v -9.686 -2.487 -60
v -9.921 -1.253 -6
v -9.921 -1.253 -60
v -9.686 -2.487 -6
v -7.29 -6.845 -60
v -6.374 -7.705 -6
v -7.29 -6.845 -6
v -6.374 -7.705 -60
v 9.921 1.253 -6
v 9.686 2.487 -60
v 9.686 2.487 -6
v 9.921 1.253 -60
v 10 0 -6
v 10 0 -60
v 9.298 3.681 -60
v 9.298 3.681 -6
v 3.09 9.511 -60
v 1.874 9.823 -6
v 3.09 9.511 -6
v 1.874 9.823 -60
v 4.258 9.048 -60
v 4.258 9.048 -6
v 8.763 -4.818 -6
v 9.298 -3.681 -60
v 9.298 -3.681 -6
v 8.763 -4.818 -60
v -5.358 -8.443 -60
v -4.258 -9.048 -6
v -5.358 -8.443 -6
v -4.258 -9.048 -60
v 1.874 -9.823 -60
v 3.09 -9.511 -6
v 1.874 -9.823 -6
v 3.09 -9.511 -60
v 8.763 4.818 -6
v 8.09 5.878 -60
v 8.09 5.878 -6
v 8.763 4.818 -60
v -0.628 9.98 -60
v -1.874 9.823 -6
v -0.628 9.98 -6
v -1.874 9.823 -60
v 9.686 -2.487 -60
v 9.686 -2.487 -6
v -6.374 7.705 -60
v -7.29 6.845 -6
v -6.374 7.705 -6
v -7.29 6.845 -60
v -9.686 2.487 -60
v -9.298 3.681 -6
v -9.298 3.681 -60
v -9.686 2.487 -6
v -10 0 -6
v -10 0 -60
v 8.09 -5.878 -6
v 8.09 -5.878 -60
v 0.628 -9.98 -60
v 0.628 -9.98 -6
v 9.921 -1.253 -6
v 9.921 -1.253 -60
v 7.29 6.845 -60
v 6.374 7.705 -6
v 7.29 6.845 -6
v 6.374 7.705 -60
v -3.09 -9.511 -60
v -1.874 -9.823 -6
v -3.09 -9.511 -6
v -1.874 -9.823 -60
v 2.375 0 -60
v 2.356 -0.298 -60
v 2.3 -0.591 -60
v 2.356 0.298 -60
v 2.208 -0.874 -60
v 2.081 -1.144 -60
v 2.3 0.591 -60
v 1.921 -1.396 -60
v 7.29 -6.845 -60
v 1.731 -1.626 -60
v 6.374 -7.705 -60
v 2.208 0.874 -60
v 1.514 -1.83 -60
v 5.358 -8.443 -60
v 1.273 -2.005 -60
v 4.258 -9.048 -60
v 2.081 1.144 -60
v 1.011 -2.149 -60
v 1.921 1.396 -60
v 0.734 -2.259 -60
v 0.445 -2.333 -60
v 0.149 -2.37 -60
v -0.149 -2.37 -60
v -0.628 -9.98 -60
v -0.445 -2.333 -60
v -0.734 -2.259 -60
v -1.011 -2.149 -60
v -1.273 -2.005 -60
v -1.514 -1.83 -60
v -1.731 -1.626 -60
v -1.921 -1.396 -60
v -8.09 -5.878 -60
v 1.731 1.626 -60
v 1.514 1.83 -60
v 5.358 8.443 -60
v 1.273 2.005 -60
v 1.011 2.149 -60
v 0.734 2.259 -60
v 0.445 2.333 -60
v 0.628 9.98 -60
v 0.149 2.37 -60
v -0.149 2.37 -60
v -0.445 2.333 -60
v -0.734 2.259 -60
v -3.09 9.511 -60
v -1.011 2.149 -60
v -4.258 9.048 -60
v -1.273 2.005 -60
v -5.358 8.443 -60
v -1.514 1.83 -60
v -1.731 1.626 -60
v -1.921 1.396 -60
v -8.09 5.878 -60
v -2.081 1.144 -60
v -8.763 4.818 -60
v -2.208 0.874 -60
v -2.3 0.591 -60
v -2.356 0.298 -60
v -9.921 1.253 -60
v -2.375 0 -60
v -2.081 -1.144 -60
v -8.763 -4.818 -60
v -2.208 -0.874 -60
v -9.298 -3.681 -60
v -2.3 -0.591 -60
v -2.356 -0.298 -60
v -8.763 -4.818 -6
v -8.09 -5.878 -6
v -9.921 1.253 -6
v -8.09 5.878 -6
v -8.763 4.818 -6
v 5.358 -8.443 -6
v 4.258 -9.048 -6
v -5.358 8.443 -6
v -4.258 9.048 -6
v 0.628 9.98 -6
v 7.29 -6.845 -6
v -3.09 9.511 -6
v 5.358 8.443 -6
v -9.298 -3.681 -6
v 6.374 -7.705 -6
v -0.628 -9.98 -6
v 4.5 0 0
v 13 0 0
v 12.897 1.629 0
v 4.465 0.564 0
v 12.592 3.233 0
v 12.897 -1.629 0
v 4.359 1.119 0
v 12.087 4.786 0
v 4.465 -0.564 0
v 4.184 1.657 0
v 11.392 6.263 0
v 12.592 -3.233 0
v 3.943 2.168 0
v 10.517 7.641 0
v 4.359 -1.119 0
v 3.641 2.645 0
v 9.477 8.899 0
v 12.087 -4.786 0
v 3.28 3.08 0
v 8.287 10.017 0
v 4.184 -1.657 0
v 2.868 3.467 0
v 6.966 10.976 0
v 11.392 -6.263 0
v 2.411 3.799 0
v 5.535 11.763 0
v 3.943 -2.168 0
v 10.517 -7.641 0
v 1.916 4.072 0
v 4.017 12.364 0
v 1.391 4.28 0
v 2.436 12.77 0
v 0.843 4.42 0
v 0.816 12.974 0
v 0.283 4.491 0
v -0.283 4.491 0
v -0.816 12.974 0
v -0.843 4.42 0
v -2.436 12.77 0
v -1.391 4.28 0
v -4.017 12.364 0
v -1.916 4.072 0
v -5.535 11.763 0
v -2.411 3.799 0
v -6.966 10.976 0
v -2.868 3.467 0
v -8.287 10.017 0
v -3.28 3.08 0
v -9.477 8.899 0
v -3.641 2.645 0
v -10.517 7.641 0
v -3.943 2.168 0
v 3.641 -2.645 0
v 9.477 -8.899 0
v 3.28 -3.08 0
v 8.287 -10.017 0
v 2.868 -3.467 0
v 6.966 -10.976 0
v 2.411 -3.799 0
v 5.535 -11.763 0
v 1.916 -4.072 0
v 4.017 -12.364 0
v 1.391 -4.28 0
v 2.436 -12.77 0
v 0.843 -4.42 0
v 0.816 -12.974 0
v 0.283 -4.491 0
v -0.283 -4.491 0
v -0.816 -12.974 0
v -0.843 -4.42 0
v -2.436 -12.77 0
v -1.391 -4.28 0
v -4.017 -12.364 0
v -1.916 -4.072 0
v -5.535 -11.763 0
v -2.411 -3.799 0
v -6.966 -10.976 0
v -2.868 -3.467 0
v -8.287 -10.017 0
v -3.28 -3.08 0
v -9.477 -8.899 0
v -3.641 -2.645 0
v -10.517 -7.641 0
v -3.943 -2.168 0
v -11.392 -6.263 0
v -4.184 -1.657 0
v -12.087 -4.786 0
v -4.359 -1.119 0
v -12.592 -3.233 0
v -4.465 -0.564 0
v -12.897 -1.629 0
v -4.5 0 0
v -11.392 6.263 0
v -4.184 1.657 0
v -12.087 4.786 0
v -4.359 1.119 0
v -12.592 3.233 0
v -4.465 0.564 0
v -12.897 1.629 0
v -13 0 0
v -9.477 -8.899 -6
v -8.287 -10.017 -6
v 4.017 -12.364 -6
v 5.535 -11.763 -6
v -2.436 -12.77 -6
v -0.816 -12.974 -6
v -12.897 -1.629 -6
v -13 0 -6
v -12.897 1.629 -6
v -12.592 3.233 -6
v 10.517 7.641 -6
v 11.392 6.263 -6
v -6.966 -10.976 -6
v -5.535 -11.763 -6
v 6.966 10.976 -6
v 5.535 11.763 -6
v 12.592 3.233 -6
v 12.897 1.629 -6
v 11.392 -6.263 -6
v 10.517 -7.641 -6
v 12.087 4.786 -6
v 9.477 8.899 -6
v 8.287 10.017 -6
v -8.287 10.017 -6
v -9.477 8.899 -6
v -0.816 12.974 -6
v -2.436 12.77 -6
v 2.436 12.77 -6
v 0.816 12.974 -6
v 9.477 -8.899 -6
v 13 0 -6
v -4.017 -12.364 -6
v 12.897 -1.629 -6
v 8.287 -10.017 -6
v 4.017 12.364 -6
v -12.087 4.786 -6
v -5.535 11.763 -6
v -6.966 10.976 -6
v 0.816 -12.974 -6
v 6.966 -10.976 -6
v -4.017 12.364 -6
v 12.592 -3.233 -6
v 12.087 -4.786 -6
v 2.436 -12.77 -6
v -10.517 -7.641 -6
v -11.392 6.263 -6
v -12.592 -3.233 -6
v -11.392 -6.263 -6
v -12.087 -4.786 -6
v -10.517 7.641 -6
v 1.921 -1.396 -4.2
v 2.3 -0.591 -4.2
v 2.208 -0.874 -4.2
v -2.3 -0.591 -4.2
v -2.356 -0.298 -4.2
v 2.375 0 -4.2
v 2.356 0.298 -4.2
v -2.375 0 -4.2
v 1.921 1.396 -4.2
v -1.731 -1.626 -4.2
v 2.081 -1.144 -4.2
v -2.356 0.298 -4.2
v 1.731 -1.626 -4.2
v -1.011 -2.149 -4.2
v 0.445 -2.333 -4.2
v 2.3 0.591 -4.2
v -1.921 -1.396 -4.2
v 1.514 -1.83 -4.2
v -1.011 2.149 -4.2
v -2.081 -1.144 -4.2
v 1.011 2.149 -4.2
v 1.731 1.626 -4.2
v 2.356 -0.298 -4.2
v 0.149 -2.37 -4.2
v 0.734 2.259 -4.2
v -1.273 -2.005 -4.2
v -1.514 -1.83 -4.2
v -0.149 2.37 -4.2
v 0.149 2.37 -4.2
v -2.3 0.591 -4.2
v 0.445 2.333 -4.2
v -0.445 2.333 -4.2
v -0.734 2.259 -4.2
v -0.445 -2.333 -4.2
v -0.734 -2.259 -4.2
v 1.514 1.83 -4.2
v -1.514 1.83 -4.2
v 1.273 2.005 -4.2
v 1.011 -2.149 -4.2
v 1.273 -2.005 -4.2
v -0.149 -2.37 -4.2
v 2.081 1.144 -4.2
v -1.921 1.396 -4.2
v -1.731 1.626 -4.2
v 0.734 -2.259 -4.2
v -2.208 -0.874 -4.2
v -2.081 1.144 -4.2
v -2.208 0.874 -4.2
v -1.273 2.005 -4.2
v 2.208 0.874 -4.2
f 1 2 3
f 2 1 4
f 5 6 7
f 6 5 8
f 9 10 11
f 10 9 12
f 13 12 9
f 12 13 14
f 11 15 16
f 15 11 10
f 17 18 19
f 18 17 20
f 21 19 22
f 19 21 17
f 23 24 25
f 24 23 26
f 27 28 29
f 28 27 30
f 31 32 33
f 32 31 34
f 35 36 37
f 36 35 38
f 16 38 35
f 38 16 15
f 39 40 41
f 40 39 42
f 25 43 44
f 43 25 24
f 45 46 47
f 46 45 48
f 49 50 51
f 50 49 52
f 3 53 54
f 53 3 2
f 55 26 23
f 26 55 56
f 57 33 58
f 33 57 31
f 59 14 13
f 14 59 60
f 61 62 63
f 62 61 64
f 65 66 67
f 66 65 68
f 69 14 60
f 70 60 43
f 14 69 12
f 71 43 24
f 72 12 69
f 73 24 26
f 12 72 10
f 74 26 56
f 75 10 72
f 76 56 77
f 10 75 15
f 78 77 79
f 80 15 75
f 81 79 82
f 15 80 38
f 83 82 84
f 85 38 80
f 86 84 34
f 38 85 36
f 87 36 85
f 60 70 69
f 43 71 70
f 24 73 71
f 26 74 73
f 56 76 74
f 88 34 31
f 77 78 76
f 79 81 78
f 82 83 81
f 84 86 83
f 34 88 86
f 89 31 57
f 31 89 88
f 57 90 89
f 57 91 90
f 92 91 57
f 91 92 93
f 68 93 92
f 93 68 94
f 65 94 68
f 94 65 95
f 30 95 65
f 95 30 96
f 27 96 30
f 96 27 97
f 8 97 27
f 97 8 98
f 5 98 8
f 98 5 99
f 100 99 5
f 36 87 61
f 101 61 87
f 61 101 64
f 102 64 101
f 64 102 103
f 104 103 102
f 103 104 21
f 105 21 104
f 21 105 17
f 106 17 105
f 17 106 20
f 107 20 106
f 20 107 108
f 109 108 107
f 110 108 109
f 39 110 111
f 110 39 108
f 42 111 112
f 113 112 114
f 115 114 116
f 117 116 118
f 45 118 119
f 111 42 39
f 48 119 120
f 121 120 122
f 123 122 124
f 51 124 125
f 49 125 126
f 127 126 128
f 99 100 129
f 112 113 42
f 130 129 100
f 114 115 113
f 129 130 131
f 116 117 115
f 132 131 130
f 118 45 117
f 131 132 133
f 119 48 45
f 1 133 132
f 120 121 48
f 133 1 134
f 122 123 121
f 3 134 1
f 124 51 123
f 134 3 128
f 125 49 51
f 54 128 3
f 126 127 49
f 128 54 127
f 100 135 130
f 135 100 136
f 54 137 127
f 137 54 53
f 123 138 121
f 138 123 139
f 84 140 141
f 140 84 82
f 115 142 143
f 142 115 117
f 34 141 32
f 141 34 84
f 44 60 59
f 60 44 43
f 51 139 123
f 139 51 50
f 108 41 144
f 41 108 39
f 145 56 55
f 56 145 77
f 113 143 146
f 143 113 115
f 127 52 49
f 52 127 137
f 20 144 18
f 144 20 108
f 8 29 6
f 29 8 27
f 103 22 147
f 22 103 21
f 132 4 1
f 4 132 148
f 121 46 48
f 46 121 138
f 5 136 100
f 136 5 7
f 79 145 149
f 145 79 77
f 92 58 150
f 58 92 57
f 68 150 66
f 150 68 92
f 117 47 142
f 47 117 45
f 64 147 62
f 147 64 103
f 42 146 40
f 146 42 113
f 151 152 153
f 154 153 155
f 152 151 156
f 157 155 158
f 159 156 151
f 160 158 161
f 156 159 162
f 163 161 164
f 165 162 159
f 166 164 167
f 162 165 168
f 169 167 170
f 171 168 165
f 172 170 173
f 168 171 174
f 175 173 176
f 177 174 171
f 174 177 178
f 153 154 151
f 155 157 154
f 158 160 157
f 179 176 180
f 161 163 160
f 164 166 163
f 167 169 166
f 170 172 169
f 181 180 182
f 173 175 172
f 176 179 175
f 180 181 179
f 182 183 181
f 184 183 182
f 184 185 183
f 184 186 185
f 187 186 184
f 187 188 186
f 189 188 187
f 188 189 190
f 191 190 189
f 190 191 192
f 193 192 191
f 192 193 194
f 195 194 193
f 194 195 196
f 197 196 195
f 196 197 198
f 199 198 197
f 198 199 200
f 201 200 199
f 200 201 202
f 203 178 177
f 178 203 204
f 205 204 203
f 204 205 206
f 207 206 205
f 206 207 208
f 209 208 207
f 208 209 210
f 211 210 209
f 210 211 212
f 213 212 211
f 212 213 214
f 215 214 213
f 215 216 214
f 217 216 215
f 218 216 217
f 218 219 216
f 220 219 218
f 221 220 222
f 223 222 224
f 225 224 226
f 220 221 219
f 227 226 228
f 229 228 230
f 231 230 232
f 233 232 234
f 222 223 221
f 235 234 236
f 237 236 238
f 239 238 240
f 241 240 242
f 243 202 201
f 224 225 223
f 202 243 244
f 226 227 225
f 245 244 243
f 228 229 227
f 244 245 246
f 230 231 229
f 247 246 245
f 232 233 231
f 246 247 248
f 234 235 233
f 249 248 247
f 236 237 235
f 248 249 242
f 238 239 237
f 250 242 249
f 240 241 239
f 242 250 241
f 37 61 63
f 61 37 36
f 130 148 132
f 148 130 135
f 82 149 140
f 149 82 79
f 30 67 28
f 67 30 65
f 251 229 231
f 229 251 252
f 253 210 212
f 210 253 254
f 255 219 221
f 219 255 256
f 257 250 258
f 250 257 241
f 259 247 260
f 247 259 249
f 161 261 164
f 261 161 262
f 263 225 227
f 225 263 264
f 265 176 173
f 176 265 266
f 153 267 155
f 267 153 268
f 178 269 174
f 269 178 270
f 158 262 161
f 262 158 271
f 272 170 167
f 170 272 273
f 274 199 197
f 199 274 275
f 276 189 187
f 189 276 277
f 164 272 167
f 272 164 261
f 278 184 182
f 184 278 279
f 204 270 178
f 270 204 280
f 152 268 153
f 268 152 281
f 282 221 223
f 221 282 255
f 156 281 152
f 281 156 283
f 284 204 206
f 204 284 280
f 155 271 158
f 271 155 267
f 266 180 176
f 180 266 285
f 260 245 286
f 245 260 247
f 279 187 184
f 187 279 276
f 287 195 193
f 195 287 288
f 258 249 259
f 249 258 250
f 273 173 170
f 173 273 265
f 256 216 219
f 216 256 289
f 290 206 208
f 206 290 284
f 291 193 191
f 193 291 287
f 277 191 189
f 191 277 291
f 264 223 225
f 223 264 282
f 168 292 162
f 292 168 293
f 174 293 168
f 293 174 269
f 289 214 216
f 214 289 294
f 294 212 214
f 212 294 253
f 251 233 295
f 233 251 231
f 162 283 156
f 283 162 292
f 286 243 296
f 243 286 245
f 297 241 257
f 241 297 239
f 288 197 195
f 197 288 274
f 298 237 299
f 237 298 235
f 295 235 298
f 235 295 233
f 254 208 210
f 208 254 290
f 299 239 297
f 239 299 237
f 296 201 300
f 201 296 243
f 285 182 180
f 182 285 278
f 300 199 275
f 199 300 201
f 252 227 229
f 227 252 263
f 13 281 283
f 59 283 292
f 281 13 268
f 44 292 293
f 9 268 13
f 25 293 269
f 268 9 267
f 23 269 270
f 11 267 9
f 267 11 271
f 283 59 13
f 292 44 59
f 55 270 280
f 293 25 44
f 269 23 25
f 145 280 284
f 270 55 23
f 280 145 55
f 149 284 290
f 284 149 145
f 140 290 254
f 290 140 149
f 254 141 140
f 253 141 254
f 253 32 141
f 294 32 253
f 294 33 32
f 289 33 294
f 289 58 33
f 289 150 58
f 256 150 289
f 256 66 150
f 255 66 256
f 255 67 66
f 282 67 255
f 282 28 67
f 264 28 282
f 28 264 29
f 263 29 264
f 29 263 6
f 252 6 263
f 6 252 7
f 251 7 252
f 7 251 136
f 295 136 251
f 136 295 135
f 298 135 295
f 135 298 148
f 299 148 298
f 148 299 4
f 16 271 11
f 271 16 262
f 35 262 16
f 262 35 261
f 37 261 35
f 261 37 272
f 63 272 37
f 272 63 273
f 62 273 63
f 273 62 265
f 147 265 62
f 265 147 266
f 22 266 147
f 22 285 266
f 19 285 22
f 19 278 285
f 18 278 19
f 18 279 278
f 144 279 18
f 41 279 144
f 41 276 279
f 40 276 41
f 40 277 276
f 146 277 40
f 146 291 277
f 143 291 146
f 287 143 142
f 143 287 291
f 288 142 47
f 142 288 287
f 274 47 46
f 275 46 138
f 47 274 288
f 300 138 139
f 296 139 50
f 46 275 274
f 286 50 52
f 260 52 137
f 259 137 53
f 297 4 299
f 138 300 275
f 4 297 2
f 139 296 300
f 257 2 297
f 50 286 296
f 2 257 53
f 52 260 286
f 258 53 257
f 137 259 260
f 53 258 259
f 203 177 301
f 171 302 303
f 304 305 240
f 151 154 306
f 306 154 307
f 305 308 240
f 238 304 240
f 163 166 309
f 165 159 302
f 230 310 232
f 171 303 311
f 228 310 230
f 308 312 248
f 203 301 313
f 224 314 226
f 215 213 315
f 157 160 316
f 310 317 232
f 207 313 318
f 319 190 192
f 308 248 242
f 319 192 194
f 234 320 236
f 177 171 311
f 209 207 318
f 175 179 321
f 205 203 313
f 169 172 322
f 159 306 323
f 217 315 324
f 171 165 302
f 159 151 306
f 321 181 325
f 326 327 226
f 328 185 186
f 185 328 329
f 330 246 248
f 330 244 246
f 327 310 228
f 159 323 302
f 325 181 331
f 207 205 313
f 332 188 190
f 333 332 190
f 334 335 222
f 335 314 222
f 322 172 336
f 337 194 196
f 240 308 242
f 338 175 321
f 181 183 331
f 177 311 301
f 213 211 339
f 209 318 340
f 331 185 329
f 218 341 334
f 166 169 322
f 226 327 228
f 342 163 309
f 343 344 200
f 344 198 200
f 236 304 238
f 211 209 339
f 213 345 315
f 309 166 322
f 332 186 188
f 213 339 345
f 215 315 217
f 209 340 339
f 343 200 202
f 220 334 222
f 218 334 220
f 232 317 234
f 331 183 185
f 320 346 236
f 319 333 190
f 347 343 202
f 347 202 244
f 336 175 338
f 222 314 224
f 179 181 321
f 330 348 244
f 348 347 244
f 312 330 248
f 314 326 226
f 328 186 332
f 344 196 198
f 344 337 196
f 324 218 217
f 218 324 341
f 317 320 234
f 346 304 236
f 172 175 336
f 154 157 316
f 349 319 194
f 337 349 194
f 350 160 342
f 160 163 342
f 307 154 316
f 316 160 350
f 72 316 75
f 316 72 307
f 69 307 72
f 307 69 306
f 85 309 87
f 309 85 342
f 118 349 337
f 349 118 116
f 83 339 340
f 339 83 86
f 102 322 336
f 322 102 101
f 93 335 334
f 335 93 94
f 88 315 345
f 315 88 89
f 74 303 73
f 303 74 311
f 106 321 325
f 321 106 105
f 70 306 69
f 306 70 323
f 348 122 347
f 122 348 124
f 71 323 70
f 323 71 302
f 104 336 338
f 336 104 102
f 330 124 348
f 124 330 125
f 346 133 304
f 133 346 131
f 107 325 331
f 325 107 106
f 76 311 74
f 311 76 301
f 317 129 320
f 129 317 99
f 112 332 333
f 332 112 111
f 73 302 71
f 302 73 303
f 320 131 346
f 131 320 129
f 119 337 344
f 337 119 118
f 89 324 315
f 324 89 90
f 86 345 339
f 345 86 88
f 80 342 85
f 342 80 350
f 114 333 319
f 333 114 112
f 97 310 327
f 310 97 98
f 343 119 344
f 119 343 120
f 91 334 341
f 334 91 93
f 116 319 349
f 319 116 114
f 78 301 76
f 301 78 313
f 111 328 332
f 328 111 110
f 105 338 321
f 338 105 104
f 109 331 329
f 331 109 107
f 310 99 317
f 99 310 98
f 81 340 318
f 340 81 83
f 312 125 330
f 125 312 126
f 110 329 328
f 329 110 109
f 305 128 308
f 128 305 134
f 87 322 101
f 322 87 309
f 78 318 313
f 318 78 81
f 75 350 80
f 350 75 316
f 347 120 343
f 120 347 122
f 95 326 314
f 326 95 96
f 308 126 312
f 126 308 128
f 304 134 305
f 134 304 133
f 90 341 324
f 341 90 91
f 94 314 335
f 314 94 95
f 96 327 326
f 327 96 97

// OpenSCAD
$fn = 50;


difference() {
	union() {
		translate(v = [0, 0, -60.0000000000]) {
			cylinder(h = 60, r = 10.0000000000);
		}
		translate(v = [0, 0, -6.0000000000]) {
			cylinder(h = 6, r = 13.0000000000);
		}
	}
	union() {
		translate(v = [0, 0, 0]) {
			rotate(a = [0, 0, 0]) {
				difference() {
					union() {
						#translate(v = [0, 0, -60.0000000000]) {
							cylinder(h = 60, r = 2.2500000000);
						}
						#translate(v = [0, 0, -4.2000000000]) {
							cylinder(h = 4.2000000000, r1 = 2.3750000000, r2 = 4.5000000000);
						}
						#translate(v = [0, 0, -60.0000000000]) {
							cylinder(h = 60, r = 2.3750000000);
						}
						#translate(v = [0, 0, -60.0000000000]) {
							cylinder(h = 60, r = 2.2500000000);
						}
					}
					union();
				}
			}
		}
	}
}
